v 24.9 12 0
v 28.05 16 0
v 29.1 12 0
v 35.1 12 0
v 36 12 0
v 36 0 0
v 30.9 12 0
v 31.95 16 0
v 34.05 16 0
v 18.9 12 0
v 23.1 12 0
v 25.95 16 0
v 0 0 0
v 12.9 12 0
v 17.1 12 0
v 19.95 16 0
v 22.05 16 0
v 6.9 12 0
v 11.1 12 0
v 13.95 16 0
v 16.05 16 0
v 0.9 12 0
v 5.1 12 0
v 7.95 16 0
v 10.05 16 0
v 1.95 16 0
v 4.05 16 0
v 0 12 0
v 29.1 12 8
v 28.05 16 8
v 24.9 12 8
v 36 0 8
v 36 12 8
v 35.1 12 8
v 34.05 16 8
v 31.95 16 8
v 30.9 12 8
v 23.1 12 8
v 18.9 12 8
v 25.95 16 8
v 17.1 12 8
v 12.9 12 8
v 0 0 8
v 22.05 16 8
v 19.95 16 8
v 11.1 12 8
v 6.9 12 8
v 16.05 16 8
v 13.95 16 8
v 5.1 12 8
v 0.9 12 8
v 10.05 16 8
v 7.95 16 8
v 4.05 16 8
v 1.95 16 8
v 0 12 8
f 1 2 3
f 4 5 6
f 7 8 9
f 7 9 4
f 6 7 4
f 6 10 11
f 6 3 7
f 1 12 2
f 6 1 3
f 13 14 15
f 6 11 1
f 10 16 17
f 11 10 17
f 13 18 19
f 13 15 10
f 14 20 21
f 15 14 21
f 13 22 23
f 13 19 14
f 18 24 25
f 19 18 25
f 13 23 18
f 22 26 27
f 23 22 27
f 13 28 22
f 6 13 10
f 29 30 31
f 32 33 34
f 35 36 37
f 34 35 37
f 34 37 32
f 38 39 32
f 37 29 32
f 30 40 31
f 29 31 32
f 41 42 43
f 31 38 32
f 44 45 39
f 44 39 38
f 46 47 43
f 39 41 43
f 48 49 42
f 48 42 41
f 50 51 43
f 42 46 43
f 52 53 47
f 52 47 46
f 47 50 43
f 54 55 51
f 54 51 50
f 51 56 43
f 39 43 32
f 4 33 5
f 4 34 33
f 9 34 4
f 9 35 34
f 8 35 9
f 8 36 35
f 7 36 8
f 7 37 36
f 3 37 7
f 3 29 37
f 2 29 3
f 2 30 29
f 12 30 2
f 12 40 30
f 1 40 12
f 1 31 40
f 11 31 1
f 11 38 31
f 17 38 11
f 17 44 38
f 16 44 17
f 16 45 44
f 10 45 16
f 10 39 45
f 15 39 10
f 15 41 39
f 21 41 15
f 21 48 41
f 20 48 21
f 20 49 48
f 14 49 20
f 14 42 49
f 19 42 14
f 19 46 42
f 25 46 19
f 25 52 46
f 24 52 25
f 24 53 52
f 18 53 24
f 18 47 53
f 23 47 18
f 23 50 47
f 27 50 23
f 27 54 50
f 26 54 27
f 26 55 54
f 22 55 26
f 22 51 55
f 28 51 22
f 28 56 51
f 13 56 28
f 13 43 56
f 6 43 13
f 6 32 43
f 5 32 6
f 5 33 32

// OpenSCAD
$fn = 32;

// ----------------------------------------------------------------------
// Gear rack: 6 teeth, pitch 6 mm
// ----------------------------------------------------------------------

// --- parameters (mm) ---
teeth = 6;                // number of teeth
pitch = 6;                // tooth pitch, X
root_w = 4.2;             // tooth width at the root
tip_w = 2.1;              // tooth width at the tip
base_h = 12;              // rack body height, Y
tooth_h = 4;              // tooth height above the body
plate_t = 8;              // rack width, Z (extrusion height)
fit_tol = 0.1;            // declared fit tolerance (prompt contract)
free_tol = 0.3;           // declared free tolerance (prompt contract)

rack_l = teeth * pitch;  // overall length
total_h = base_h + tooth_h;  // overall height

profile = [[0, 0], [36, 0], [36, 12], [35.1, 12], [34.05, 16], [31.95, 16], [30.9, 12], [29.1, 12], [28.05, 16], [25.95, 16], [24.9, 12], [23.1, 12], [22.05, 16], [19.95, 16], [18.9, 12], [17.1, 12], [16.05, 16], [13.95, 16], [12.9, 12], [11.1, 12], [10.05, 16], [7.95, 16], [6.9, 12], [5.1, 12], [4.05, 16], [1.95, 16], [0.9, 12], [0, 12]];  // primary outline, 28 points, counter clockwise

// --- the one profile operation ---
linear_extrude(height = plate_t) polygon(points = profile);
